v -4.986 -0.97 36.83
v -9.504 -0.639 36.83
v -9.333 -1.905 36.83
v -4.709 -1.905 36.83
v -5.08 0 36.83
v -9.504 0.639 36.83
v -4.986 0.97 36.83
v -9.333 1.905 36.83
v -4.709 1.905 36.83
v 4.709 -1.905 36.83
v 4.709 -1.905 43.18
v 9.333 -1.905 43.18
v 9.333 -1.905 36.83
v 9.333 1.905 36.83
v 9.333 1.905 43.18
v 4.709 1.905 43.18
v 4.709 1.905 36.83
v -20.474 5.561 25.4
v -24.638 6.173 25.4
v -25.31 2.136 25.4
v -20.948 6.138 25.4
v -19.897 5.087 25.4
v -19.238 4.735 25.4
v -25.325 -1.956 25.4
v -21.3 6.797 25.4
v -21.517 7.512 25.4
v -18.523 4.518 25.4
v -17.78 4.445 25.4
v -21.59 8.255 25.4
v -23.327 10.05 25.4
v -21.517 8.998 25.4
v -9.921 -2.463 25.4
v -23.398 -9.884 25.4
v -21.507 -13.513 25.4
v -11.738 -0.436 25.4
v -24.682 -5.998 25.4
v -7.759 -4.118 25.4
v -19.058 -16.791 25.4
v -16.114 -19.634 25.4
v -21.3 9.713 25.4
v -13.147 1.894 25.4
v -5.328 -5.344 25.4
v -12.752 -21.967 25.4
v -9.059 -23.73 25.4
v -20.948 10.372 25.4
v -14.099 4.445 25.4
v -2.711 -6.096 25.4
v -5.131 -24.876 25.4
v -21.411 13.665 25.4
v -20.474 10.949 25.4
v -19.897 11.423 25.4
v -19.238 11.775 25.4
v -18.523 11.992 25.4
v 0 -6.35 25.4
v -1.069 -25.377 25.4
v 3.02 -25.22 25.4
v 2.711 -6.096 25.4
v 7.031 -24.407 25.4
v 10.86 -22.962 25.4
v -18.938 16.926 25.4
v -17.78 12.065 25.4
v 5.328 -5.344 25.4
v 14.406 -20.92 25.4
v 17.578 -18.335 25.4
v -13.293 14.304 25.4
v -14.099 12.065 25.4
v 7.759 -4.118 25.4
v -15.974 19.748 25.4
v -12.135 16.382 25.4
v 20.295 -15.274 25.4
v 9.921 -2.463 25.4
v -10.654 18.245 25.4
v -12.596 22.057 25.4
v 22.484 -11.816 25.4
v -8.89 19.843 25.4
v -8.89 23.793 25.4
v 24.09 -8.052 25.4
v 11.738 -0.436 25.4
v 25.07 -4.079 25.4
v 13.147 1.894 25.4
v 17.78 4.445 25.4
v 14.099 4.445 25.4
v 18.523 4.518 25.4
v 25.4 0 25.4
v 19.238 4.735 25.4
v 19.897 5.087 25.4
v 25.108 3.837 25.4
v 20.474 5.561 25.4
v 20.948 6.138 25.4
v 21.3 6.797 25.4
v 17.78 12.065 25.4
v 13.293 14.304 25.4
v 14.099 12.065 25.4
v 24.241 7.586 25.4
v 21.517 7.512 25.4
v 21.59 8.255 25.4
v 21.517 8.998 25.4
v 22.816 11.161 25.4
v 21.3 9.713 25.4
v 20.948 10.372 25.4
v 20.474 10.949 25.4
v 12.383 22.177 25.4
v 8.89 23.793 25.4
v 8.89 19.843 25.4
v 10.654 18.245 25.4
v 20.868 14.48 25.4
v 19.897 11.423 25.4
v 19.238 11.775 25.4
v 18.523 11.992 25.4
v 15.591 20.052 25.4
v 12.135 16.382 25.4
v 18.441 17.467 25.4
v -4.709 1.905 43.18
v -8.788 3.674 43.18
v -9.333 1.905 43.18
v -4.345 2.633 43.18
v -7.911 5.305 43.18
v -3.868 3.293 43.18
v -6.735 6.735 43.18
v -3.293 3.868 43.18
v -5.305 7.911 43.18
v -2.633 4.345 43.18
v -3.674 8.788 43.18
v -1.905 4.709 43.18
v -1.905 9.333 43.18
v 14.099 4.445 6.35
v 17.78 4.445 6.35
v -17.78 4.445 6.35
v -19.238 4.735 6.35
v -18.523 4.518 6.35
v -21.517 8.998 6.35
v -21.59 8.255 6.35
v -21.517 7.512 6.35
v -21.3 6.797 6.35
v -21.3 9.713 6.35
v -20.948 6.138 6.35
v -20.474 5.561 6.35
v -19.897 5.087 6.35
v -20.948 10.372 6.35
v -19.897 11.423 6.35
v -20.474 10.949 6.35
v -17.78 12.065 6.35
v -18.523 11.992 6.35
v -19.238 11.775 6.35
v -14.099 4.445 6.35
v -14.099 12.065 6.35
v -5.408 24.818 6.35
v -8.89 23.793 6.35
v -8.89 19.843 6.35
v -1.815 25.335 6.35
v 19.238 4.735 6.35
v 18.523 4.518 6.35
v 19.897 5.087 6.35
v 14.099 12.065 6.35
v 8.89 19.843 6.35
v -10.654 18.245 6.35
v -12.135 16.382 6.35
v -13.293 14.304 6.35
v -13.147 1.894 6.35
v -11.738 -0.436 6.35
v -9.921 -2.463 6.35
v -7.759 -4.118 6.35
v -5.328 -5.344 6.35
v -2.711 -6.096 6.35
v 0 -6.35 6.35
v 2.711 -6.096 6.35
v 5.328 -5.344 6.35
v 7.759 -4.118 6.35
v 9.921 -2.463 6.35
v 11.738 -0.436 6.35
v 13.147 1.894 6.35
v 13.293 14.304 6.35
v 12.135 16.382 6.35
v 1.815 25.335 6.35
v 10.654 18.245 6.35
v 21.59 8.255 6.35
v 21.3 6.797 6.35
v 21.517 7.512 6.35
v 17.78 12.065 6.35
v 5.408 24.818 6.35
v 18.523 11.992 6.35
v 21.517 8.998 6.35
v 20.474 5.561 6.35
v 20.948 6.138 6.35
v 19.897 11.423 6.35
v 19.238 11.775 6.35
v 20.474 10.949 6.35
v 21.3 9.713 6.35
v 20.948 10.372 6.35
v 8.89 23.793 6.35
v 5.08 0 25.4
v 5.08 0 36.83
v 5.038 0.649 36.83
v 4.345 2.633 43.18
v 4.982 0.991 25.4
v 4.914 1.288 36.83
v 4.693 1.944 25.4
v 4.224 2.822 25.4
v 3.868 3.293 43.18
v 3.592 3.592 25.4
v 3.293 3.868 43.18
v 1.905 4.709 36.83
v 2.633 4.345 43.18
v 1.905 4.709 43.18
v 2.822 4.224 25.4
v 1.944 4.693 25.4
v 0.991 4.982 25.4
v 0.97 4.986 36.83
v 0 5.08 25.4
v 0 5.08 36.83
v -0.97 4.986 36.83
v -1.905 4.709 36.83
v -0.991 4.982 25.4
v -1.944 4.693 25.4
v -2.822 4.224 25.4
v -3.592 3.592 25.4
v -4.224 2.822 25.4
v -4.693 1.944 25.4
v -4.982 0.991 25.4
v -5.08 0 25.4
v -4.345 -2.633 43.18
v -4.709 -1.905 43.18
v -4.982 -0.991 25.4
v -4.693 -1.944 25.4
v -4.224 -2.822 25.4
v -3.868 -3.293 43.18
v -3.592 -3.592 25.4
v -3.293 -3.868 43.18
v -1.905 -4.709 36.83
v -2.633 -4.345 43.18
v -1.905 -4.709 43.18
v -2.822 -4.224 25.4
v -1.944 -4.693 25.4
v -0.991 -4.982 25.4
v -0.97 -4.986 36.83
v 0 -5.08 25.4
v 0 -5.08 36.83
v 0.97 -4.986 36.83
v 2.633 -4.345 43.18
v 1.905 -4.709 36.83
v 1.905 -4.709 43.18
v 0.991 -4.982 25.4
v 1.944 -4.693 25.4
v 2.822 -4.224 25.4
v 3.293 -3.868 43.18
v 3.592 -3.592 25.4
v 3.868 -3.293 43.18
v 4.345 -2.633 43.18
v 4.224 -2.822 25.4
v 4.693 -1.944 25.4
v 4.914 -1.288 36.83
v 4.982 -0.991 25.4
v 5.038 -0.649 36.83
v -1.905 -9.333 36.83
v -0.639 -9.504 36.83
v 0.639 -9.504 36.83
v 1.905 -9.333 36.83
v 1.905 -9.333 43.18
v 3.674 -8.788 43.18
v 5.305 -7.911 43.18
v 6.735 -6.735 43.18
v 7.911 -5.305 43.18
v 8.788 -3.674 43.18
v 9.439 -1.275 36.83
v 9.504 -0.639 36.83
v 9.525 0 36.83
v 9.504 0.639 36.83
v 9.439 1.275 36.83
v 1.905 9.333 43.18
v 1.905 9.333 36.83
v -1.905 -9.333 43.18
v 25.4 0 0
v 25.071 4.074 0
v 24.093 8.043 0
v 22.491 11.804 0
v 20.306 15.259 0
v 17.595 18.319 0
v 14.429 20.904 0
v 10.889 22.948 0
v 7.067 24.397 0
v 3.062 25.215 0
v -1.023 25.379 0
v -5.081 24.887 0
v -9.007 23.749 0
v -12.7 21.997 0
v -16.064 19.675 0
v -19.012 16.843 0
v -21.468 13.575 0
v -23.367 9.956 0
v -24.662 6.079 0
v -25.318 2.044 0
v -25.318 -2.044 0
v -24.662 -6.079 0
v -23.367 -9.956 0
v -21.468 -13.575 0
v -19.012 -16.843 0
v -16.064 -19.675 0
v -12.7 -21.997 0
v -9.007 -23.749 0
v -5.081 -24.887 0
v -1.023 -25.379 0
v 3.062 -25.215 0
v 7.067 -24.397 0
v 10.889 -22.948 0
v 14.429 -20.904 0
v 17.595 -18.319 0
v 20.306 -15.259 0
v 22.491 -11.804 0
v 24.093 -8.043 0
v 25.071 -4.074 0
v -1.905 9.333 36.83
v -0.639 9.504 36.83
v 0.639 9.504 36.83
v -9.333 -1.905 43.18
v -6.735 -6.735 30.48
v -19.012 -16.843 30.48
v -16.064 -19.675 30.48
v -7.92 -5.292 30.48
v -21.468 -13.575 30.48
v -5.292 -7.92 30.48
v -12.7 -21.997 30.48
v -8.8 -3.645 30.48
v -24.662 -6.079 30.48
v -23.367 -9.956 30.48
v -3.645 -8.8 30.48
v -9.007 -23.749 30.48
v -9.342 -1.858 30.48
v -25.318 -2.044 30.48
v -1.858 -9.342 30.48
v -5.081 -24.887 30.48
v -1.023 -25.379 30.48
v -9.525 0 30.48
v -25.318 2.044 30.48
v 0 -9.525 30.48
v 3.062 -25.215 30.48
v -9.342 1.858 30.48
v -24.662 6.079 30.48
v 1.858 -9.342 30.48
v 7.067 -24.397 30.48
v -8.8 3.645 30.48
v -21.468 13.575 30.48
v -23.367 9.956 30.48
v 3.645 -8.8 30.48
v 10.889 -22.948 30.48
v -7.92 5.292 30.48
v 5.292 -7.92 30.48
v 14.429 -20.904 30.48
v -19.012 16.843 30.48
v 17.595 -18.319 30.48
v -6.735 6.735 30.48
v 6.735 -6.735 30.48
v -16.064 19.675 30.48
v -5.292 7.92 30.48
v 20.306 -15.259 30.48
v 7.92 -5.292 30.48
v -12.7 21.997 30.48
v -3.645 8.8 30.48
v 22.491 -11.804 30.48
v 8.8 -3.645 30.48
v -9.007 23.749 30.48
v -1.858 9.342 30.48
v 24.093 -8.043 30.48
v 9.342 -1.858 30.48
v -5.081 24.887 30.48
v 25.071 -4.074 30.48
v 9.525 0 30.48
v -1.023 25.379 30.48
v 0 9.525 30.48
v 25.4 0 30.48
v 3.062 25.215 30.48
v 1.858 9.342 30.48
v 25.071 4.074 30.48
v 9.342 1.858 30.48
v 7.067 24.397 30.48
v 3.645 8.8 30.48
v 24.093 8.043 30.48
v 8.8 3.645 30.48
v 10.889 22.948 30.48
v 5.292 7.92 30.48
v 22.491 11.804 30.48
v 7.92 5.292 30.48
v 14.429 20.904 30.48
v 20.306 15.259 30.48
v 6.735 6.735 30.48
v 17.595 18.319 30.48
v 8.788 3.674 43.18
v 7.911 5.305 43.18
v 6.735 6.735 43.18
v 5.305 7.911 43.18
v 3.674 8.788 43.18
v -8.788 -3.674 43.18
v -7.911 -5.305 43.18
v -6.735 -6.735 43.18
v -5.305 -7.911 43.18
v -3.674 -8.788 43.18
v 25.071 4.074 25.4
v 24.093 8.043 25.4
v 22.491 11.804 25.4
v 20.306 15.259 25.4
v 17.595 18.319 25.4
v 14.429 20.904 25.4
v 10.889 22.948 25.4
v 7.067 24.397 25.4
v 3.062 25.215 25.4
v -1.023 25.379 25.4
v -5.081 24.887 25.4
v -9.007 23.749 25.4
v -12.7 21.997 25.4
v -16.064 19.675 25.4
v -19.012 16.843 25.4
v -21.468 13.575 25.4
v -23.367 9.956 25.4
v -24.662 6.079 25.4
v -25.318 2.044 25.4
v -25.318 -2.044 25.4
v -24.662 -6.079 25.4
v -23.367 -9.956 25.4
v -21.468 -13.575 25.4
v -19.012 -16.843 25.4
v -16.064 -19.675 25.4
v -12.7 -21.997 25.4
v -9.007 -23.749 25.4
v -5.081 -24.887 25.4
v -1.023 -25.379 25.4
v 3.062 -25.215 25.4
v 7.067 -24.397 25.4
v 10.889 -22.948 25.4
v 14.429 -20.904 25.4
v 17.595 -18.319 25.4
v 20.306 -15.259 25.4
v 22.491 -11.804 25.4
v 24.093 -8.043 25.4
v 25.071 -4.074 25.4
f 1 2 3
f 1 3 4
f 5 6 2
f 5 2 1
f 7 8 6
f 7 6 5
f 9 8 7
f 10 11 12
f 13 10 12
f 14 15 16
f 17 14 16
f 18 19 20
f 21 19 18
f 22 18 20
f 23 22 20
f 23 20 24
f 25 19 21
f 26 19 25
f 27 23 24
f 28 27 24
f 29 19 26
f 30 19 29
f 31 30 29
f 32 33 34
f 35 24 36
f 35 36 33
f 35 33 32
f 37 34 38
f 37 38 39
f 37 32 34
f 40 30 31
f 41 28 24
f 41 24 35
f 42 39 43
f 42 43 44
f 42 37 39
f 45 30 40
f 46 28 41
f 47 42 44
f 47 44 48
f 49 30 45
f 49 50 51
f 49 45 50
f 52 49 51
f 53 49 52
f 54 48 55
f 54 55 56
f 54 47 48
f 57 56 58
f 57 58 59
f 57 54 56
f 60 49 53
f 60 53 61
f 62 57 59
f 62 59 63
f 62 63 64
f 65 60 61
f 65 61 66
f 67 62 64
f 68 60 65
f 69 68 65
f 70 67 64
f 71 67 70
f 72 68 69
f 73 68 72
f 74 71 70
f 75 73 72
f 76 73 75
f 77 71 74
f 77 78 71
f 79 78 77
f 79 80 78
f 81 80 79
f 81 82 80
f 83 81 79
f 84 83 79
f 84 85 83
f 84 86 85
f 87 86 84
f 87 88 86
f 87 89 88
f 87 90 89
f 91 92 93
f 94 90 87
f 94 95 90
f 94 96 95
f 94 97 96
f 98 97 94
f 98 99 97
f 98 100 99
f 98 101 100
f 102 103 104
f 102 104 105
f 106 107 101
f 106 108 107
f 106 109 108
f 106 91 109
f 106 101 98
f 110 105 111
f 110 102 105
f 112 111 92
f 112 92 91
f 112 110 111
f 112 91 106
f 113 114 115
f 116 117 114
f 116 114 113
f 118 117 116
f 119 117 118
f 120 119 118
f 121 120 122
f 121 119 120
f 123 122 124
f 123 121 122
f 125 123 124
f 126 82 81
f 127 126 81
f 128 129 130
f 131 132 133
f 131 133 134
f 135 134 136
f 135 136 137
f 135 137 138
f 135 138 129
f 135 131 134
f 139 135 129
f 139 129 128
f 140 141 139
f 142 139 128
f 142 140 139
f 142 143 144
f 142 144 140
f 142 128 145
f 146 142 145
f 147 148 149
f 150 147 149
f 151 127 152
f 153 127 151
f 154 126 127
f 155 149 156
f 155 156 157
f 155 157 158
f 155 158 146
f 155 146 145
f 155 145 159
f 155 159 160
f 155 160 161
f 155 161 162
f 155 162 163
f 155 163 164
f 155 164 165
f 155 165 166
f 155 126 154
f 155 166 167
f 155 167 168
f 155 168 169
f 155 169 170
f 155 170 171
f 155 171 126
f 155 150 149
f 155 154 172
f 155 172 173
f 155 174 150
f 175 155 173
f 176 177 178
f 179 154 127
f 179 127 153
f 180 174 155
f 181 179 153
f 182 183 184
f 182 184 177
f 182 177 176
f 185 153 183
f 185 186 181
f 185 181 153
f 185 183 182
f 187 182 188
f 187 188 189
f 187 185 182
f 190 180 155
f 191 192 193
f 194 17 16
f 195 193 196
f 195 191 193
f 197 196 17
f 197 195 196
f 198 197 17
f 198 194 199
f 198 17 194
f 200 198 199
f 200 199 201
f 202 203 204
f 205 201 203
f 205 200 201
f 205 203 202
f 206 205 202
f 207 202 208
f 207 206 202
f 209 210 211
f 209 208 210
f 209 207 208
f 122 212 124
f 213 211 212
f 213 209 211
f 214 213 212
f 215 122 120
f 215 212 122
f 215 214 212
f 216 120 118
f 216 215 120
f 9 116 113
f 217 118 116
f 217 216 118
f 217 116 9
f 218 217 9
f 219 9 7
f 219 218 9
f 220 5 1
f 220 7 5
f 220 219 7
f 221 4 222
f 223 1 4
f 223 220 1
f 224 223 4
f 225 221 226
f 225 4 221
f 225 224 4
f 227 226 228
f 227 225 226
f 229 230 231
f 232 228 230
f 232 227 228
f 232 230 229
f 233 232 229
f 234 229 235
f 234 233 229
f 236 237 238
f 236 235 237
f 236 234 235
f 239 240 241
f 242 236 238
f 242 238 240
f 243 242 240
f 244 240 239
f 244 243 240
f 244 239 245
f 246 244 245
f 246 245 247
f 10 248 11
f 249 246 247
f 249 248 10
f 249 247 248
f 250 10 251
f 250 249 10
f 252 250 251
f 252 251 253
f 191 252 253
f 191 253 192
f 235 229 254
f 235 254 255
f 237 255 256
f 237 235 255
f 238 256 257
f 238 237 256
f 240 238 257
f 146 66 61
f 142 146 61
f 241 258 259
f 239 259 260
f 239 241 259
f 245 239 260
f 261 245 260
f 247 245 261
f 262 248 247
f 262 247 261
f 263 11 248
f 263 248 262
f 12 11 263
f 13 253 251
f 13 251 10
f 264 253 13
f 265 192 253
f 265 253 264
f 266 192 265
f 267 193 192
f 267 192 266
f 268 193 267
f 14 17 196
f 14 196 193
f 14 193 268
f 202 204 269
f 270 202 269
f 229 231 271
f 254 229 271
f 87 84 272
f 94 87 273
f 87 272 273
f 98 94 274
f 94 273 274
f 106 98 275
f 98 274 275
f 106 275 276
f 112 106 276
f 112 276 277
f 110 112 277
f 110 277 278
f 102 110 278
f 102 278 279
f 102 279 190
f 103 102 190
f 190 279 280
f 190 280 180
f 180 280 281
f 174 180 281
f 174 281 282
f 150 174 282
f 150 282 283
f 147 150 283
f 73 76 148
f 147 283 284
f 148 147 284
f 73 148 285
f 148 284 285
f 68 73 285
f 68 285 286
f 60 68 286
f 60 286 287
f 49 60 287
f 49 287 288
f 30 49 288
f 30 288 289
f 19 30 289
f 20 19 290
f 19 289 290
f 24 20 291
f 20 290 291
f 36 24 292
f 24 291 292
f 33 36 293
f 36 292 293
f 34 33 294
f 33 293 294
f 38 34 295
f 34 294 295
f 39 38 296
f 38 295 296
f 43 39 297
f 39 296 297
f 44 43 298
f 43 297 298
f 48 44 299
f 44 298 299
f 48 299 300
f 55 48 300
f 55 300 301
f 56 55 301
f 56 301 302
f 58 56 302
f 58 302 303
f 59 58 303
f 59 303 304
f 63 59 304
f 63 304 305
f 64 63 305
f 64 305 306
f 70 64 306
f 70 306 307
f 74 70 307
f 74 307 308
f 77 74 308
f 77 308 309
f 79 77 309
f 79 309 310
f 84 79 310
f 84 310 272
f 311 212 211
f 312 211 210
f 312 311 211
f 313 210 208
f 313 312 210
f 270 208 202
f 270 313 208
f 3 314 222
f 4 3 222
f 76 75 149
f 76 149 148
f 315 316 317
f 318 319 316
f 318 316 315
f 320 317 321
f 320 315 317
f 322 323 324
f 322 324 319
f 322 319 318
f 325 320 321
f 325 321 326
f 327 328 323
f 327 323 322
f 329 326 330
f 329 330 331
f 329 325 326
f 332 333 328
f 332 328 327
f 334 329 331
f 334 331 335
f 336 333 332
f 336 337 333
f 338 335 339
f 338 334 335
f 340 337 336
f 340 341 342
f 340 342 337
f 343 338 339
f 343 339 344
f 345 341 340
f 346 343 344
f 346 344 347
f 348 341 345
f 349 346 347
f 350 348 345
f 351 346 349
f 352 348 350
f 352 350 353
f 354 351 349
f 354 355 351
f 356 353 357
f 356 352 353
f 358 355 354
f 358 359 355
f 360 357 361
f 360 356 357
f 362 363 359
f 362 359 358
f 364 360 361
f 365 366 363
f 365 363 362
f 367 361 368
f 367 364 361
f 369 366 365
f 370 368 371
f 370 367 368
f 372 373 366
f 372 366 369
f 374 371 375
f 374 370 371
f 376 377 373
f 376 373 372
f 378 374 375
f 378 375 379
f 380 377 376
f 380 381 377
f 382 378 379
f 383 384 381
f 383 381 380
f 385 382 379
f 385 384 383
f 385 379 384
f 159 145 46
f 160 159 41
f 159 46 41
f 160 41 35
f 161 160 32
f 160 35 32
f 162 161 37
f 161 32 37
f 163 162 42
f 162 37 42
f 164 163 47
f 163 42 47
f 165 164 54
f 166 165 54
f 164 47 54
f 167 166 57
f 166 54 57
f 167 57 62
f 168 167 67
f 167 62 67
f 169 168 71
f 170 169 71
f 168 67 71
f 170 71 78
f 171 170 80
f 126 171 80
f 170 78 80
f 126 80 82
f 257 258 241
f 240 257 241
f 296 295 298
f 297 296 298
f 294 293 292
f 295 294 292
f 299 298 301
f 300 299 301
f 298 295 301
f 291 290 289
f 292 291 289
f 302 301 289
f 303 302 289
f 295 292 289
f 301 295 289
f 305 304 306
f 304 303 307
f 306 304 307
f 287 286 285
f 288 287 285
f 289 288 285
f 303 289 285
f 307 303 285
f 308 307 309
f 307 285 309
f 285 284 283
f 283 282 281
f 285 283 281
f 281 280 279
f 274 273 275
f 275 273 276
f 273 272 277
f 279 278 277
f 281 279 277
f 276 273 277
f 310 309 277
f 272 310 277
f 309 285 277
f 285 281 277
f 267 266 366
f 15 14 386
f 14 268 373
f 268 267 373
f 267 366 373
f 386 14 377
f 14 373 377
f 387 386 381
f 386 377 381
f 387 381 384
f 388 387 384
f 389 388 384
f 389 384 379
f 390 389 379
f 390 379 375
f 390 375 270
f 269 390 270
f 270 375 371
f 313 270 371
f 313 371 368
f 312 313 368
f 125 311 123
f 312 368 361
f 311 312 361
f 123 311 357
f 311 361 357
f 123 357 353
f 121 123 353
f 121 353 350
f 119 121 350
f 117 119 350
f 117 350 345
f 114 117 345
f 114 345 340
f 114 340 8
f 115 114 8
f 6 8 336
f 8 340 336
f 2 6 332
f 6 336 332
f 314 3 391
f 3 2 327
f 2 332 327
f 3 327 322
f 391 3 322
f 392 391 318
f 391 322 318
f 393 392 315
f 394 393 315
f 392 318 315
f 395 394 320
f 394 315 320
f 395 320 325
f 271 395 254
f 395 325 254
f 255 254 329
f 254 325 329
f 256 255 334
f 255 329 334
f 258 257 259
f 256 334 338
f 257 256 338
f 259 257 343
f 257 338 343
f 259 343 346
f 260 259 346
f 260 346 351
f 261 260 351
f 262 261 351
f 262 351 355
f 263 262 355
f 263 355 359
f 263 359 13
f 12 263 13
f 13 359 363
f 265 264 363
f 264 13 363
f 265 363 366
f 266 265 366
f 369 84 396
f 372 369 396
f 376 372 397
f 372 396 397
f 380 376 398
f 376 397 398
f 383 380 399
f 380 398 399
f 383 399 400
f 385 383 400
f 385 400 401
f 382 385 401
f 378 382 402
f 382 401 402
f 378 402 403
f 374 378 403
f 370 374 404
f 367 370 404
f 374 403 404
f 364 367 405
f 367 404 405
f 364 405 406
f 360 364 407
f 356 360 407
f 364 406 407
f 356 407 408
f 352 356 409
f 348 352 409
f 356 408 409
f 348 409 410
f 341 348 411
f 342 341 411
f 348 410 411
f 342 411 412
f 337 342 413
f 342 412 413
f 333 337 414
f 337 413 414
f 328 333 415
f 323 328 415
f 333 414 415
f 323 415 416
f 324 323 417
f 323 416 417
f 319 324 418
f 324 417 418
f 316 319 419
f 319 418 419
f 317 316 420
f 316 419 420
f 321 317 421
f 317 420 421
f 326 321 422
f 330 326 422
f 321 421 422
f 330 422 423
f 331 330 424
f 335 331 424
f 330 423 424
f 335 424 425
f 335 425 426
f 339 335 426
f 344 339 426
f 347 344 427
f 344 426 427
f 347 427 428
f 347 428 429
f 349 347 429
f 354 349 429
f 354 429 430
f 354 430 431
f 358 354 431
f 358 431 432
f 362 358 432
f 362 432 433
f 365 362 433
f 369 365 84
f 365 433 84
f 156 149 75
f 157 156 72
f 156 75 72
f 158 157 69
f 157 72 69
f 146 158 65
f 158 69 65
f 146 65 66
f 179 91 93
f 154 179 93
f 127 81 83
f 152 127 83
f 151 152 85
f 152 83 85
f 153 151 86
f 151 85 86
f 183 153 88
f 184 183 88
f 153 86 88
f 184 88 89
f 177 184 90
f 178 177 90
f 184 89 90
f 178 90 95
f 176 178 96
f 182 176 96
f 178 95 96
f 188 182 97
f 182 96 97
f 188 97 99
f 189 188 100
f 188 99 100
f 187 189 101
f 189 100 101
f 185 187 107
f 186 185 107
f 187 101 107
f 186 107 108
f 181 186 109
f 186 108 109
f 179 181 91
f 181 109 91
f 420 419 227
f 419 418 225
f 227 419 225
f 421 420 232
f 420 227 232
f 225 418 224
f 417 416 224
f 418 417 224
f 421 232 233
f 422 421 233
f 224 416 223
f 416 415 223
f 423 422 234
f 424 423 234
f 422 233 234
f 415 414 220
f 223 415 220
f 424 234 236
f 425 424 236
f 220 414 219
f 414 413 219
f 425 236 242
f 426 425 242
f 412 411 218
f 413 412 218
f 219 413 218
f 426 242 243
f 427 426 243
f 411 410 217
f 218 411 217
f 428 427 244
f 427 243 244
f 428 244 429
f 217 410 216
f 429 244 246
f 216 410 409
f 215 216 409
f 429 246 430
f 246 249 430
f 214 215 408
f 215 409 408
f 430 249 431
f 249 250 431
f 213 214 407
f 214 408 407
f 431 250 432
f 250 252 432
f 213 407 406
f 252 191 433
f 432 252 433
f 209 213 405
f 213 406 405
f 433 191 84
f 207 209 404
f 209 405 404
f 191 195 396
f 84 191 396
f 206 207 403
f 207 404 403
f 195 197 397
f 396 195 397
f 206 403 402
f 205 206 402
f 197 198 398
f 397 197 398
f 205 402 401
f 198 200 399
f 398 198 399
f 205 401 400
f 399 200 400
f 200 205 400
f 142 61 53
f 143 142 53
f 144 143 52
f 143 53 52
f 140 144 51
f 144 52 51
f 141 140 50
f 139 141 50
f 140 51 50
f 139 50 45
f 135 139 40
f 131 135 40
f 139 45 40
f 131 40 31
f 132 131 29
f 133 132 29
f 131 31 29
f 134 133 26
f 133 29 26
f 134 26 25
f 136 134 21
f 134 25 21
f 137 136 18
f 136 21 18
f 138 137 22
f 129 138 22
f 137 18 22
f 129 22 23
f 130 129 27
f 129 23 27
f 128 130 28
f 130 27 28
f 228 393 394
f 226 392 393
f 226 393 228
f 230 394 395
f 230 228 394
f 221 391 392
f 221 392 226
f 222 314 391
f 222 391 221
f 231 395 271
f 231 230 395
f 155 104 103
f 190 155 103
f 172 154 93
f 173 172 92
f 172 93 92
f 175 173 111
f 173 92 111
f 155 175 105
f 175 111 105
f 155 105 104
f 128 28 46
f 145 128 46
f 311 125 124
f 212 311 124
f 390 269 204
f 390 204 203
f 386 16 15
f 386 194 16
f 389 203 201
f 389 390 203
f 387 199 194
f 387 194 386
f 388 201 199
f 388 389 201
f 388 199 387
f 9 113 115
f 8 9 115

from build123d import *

# Parameters (mm, degrees)
F0_R      = 25.4
F1_DEPTH  = 25.4
F2_R      = 14.605
F3_DEPTH  = 19.05
F4_W      = 7.62
F4_H      = 3.81
F5_DEPTH  = 25.401
F7_W      = 17.78
F7_H      = 6.827337
F8_DEPTH  = 19.05
F10_DEPTH = 19.05
F11_R     = 25.4
F11_R_2   = 5.08
F12_DEPTH = 5.08
F13_R     = 9.525
F13_R_2   = 5.08
F14_DEPTH = 12.7
F16_DEPTH = 6.35


with BuildPart() as f1:
    # F0 (on Top) → F1 (new body)
    with BuildSketch(Plane.XY):
        Circle(F0_R)
    extrude(amount=F1_DEPTH)

    # F2 (on face) → F3 (cut)
    with BuildSketch(Plane.XY.offset(25.4)):
        with Locations((0, 8.255)):
            Circle(F2_R)
    extrude(amount=-F3_DEPTH, mode=Mode.SUBTRACT)

    # F4 (on Front) → F5 (cut, through all)
    with BuildSketch(Plane.XZ):
        with Locations((0, 23.495)):
            Rectangle(F4_W, F4_H)
    extrude(amount=-F5_DEPTH, mode=Mode.SUBTRACT)

    # F7 (on face) → F8 (cut, through all)
    with BuildSketch(Plane.XY.offset(25.4)):
        with Locations((0, 23.256331)):
            Rectangle(F7_W, F7_H)
    extrude(amount=-F8_DEPTH, mode=Mode.SUBTRACT)

    # F9 (on face) → F10 (cut, through all)
    with BuildSketch(Plane.XY.offset(25.4)):
        with BuildLine():
            Line((17.78, 12.065), (-17.78, 12.065))
            ThreePointArc((-17.78, 12.065), (-21.59, 8.255), (-17.78, 4.445))
            Line((-17.78, 4.445), (17.78, 4.445))
            ThreePointArc((17.78, 4.445), (21.59, 8.255), (17.78, 12.065))
        make_face()
    extrude(amount=-F10_DEPTH, mode=Mode.SUBTRACT)


with BuildPart() as f12:
    # F11 (on face) → F12 (new body)
    with BuildSketch(Plane.XY.offset(25.4)):
        Circle(F11_R)
        Circle(F11_R_2, mode=Mode.SUBTRACT)
    extrude(amount=F12_DEPTH)

    # F13 (on face) → F14 (join)
    with BuildSketch(Plane.XY.offset(30.48)):
        Circle(F13_R)
        Circle(F13_R_2, mode=Mode.SUBTRACT)
    extrude(amount=F14_DEPTH)

    # F15 (on face) → F16 (cut)
    with BuildSketch(Plane.XY.offset(43.18)):
        Polygon((1.905, 14.605), (-1.905, 14.605), (-1.905, 1.905), (-14.605, 1.905), (-14.605, -1.905), (-1.905, -1.905), (-1.905, -14.605), (1.905, -14.605), (1.905, -1.905), (14.605, -1.905), (14.605, 1.905), (1.905, 1.905), align=None)
    extrude(amount=-F16_DEPTH, mode=Mode.SUBTRACT)


solid = Compound([f1.part, f12.part])
